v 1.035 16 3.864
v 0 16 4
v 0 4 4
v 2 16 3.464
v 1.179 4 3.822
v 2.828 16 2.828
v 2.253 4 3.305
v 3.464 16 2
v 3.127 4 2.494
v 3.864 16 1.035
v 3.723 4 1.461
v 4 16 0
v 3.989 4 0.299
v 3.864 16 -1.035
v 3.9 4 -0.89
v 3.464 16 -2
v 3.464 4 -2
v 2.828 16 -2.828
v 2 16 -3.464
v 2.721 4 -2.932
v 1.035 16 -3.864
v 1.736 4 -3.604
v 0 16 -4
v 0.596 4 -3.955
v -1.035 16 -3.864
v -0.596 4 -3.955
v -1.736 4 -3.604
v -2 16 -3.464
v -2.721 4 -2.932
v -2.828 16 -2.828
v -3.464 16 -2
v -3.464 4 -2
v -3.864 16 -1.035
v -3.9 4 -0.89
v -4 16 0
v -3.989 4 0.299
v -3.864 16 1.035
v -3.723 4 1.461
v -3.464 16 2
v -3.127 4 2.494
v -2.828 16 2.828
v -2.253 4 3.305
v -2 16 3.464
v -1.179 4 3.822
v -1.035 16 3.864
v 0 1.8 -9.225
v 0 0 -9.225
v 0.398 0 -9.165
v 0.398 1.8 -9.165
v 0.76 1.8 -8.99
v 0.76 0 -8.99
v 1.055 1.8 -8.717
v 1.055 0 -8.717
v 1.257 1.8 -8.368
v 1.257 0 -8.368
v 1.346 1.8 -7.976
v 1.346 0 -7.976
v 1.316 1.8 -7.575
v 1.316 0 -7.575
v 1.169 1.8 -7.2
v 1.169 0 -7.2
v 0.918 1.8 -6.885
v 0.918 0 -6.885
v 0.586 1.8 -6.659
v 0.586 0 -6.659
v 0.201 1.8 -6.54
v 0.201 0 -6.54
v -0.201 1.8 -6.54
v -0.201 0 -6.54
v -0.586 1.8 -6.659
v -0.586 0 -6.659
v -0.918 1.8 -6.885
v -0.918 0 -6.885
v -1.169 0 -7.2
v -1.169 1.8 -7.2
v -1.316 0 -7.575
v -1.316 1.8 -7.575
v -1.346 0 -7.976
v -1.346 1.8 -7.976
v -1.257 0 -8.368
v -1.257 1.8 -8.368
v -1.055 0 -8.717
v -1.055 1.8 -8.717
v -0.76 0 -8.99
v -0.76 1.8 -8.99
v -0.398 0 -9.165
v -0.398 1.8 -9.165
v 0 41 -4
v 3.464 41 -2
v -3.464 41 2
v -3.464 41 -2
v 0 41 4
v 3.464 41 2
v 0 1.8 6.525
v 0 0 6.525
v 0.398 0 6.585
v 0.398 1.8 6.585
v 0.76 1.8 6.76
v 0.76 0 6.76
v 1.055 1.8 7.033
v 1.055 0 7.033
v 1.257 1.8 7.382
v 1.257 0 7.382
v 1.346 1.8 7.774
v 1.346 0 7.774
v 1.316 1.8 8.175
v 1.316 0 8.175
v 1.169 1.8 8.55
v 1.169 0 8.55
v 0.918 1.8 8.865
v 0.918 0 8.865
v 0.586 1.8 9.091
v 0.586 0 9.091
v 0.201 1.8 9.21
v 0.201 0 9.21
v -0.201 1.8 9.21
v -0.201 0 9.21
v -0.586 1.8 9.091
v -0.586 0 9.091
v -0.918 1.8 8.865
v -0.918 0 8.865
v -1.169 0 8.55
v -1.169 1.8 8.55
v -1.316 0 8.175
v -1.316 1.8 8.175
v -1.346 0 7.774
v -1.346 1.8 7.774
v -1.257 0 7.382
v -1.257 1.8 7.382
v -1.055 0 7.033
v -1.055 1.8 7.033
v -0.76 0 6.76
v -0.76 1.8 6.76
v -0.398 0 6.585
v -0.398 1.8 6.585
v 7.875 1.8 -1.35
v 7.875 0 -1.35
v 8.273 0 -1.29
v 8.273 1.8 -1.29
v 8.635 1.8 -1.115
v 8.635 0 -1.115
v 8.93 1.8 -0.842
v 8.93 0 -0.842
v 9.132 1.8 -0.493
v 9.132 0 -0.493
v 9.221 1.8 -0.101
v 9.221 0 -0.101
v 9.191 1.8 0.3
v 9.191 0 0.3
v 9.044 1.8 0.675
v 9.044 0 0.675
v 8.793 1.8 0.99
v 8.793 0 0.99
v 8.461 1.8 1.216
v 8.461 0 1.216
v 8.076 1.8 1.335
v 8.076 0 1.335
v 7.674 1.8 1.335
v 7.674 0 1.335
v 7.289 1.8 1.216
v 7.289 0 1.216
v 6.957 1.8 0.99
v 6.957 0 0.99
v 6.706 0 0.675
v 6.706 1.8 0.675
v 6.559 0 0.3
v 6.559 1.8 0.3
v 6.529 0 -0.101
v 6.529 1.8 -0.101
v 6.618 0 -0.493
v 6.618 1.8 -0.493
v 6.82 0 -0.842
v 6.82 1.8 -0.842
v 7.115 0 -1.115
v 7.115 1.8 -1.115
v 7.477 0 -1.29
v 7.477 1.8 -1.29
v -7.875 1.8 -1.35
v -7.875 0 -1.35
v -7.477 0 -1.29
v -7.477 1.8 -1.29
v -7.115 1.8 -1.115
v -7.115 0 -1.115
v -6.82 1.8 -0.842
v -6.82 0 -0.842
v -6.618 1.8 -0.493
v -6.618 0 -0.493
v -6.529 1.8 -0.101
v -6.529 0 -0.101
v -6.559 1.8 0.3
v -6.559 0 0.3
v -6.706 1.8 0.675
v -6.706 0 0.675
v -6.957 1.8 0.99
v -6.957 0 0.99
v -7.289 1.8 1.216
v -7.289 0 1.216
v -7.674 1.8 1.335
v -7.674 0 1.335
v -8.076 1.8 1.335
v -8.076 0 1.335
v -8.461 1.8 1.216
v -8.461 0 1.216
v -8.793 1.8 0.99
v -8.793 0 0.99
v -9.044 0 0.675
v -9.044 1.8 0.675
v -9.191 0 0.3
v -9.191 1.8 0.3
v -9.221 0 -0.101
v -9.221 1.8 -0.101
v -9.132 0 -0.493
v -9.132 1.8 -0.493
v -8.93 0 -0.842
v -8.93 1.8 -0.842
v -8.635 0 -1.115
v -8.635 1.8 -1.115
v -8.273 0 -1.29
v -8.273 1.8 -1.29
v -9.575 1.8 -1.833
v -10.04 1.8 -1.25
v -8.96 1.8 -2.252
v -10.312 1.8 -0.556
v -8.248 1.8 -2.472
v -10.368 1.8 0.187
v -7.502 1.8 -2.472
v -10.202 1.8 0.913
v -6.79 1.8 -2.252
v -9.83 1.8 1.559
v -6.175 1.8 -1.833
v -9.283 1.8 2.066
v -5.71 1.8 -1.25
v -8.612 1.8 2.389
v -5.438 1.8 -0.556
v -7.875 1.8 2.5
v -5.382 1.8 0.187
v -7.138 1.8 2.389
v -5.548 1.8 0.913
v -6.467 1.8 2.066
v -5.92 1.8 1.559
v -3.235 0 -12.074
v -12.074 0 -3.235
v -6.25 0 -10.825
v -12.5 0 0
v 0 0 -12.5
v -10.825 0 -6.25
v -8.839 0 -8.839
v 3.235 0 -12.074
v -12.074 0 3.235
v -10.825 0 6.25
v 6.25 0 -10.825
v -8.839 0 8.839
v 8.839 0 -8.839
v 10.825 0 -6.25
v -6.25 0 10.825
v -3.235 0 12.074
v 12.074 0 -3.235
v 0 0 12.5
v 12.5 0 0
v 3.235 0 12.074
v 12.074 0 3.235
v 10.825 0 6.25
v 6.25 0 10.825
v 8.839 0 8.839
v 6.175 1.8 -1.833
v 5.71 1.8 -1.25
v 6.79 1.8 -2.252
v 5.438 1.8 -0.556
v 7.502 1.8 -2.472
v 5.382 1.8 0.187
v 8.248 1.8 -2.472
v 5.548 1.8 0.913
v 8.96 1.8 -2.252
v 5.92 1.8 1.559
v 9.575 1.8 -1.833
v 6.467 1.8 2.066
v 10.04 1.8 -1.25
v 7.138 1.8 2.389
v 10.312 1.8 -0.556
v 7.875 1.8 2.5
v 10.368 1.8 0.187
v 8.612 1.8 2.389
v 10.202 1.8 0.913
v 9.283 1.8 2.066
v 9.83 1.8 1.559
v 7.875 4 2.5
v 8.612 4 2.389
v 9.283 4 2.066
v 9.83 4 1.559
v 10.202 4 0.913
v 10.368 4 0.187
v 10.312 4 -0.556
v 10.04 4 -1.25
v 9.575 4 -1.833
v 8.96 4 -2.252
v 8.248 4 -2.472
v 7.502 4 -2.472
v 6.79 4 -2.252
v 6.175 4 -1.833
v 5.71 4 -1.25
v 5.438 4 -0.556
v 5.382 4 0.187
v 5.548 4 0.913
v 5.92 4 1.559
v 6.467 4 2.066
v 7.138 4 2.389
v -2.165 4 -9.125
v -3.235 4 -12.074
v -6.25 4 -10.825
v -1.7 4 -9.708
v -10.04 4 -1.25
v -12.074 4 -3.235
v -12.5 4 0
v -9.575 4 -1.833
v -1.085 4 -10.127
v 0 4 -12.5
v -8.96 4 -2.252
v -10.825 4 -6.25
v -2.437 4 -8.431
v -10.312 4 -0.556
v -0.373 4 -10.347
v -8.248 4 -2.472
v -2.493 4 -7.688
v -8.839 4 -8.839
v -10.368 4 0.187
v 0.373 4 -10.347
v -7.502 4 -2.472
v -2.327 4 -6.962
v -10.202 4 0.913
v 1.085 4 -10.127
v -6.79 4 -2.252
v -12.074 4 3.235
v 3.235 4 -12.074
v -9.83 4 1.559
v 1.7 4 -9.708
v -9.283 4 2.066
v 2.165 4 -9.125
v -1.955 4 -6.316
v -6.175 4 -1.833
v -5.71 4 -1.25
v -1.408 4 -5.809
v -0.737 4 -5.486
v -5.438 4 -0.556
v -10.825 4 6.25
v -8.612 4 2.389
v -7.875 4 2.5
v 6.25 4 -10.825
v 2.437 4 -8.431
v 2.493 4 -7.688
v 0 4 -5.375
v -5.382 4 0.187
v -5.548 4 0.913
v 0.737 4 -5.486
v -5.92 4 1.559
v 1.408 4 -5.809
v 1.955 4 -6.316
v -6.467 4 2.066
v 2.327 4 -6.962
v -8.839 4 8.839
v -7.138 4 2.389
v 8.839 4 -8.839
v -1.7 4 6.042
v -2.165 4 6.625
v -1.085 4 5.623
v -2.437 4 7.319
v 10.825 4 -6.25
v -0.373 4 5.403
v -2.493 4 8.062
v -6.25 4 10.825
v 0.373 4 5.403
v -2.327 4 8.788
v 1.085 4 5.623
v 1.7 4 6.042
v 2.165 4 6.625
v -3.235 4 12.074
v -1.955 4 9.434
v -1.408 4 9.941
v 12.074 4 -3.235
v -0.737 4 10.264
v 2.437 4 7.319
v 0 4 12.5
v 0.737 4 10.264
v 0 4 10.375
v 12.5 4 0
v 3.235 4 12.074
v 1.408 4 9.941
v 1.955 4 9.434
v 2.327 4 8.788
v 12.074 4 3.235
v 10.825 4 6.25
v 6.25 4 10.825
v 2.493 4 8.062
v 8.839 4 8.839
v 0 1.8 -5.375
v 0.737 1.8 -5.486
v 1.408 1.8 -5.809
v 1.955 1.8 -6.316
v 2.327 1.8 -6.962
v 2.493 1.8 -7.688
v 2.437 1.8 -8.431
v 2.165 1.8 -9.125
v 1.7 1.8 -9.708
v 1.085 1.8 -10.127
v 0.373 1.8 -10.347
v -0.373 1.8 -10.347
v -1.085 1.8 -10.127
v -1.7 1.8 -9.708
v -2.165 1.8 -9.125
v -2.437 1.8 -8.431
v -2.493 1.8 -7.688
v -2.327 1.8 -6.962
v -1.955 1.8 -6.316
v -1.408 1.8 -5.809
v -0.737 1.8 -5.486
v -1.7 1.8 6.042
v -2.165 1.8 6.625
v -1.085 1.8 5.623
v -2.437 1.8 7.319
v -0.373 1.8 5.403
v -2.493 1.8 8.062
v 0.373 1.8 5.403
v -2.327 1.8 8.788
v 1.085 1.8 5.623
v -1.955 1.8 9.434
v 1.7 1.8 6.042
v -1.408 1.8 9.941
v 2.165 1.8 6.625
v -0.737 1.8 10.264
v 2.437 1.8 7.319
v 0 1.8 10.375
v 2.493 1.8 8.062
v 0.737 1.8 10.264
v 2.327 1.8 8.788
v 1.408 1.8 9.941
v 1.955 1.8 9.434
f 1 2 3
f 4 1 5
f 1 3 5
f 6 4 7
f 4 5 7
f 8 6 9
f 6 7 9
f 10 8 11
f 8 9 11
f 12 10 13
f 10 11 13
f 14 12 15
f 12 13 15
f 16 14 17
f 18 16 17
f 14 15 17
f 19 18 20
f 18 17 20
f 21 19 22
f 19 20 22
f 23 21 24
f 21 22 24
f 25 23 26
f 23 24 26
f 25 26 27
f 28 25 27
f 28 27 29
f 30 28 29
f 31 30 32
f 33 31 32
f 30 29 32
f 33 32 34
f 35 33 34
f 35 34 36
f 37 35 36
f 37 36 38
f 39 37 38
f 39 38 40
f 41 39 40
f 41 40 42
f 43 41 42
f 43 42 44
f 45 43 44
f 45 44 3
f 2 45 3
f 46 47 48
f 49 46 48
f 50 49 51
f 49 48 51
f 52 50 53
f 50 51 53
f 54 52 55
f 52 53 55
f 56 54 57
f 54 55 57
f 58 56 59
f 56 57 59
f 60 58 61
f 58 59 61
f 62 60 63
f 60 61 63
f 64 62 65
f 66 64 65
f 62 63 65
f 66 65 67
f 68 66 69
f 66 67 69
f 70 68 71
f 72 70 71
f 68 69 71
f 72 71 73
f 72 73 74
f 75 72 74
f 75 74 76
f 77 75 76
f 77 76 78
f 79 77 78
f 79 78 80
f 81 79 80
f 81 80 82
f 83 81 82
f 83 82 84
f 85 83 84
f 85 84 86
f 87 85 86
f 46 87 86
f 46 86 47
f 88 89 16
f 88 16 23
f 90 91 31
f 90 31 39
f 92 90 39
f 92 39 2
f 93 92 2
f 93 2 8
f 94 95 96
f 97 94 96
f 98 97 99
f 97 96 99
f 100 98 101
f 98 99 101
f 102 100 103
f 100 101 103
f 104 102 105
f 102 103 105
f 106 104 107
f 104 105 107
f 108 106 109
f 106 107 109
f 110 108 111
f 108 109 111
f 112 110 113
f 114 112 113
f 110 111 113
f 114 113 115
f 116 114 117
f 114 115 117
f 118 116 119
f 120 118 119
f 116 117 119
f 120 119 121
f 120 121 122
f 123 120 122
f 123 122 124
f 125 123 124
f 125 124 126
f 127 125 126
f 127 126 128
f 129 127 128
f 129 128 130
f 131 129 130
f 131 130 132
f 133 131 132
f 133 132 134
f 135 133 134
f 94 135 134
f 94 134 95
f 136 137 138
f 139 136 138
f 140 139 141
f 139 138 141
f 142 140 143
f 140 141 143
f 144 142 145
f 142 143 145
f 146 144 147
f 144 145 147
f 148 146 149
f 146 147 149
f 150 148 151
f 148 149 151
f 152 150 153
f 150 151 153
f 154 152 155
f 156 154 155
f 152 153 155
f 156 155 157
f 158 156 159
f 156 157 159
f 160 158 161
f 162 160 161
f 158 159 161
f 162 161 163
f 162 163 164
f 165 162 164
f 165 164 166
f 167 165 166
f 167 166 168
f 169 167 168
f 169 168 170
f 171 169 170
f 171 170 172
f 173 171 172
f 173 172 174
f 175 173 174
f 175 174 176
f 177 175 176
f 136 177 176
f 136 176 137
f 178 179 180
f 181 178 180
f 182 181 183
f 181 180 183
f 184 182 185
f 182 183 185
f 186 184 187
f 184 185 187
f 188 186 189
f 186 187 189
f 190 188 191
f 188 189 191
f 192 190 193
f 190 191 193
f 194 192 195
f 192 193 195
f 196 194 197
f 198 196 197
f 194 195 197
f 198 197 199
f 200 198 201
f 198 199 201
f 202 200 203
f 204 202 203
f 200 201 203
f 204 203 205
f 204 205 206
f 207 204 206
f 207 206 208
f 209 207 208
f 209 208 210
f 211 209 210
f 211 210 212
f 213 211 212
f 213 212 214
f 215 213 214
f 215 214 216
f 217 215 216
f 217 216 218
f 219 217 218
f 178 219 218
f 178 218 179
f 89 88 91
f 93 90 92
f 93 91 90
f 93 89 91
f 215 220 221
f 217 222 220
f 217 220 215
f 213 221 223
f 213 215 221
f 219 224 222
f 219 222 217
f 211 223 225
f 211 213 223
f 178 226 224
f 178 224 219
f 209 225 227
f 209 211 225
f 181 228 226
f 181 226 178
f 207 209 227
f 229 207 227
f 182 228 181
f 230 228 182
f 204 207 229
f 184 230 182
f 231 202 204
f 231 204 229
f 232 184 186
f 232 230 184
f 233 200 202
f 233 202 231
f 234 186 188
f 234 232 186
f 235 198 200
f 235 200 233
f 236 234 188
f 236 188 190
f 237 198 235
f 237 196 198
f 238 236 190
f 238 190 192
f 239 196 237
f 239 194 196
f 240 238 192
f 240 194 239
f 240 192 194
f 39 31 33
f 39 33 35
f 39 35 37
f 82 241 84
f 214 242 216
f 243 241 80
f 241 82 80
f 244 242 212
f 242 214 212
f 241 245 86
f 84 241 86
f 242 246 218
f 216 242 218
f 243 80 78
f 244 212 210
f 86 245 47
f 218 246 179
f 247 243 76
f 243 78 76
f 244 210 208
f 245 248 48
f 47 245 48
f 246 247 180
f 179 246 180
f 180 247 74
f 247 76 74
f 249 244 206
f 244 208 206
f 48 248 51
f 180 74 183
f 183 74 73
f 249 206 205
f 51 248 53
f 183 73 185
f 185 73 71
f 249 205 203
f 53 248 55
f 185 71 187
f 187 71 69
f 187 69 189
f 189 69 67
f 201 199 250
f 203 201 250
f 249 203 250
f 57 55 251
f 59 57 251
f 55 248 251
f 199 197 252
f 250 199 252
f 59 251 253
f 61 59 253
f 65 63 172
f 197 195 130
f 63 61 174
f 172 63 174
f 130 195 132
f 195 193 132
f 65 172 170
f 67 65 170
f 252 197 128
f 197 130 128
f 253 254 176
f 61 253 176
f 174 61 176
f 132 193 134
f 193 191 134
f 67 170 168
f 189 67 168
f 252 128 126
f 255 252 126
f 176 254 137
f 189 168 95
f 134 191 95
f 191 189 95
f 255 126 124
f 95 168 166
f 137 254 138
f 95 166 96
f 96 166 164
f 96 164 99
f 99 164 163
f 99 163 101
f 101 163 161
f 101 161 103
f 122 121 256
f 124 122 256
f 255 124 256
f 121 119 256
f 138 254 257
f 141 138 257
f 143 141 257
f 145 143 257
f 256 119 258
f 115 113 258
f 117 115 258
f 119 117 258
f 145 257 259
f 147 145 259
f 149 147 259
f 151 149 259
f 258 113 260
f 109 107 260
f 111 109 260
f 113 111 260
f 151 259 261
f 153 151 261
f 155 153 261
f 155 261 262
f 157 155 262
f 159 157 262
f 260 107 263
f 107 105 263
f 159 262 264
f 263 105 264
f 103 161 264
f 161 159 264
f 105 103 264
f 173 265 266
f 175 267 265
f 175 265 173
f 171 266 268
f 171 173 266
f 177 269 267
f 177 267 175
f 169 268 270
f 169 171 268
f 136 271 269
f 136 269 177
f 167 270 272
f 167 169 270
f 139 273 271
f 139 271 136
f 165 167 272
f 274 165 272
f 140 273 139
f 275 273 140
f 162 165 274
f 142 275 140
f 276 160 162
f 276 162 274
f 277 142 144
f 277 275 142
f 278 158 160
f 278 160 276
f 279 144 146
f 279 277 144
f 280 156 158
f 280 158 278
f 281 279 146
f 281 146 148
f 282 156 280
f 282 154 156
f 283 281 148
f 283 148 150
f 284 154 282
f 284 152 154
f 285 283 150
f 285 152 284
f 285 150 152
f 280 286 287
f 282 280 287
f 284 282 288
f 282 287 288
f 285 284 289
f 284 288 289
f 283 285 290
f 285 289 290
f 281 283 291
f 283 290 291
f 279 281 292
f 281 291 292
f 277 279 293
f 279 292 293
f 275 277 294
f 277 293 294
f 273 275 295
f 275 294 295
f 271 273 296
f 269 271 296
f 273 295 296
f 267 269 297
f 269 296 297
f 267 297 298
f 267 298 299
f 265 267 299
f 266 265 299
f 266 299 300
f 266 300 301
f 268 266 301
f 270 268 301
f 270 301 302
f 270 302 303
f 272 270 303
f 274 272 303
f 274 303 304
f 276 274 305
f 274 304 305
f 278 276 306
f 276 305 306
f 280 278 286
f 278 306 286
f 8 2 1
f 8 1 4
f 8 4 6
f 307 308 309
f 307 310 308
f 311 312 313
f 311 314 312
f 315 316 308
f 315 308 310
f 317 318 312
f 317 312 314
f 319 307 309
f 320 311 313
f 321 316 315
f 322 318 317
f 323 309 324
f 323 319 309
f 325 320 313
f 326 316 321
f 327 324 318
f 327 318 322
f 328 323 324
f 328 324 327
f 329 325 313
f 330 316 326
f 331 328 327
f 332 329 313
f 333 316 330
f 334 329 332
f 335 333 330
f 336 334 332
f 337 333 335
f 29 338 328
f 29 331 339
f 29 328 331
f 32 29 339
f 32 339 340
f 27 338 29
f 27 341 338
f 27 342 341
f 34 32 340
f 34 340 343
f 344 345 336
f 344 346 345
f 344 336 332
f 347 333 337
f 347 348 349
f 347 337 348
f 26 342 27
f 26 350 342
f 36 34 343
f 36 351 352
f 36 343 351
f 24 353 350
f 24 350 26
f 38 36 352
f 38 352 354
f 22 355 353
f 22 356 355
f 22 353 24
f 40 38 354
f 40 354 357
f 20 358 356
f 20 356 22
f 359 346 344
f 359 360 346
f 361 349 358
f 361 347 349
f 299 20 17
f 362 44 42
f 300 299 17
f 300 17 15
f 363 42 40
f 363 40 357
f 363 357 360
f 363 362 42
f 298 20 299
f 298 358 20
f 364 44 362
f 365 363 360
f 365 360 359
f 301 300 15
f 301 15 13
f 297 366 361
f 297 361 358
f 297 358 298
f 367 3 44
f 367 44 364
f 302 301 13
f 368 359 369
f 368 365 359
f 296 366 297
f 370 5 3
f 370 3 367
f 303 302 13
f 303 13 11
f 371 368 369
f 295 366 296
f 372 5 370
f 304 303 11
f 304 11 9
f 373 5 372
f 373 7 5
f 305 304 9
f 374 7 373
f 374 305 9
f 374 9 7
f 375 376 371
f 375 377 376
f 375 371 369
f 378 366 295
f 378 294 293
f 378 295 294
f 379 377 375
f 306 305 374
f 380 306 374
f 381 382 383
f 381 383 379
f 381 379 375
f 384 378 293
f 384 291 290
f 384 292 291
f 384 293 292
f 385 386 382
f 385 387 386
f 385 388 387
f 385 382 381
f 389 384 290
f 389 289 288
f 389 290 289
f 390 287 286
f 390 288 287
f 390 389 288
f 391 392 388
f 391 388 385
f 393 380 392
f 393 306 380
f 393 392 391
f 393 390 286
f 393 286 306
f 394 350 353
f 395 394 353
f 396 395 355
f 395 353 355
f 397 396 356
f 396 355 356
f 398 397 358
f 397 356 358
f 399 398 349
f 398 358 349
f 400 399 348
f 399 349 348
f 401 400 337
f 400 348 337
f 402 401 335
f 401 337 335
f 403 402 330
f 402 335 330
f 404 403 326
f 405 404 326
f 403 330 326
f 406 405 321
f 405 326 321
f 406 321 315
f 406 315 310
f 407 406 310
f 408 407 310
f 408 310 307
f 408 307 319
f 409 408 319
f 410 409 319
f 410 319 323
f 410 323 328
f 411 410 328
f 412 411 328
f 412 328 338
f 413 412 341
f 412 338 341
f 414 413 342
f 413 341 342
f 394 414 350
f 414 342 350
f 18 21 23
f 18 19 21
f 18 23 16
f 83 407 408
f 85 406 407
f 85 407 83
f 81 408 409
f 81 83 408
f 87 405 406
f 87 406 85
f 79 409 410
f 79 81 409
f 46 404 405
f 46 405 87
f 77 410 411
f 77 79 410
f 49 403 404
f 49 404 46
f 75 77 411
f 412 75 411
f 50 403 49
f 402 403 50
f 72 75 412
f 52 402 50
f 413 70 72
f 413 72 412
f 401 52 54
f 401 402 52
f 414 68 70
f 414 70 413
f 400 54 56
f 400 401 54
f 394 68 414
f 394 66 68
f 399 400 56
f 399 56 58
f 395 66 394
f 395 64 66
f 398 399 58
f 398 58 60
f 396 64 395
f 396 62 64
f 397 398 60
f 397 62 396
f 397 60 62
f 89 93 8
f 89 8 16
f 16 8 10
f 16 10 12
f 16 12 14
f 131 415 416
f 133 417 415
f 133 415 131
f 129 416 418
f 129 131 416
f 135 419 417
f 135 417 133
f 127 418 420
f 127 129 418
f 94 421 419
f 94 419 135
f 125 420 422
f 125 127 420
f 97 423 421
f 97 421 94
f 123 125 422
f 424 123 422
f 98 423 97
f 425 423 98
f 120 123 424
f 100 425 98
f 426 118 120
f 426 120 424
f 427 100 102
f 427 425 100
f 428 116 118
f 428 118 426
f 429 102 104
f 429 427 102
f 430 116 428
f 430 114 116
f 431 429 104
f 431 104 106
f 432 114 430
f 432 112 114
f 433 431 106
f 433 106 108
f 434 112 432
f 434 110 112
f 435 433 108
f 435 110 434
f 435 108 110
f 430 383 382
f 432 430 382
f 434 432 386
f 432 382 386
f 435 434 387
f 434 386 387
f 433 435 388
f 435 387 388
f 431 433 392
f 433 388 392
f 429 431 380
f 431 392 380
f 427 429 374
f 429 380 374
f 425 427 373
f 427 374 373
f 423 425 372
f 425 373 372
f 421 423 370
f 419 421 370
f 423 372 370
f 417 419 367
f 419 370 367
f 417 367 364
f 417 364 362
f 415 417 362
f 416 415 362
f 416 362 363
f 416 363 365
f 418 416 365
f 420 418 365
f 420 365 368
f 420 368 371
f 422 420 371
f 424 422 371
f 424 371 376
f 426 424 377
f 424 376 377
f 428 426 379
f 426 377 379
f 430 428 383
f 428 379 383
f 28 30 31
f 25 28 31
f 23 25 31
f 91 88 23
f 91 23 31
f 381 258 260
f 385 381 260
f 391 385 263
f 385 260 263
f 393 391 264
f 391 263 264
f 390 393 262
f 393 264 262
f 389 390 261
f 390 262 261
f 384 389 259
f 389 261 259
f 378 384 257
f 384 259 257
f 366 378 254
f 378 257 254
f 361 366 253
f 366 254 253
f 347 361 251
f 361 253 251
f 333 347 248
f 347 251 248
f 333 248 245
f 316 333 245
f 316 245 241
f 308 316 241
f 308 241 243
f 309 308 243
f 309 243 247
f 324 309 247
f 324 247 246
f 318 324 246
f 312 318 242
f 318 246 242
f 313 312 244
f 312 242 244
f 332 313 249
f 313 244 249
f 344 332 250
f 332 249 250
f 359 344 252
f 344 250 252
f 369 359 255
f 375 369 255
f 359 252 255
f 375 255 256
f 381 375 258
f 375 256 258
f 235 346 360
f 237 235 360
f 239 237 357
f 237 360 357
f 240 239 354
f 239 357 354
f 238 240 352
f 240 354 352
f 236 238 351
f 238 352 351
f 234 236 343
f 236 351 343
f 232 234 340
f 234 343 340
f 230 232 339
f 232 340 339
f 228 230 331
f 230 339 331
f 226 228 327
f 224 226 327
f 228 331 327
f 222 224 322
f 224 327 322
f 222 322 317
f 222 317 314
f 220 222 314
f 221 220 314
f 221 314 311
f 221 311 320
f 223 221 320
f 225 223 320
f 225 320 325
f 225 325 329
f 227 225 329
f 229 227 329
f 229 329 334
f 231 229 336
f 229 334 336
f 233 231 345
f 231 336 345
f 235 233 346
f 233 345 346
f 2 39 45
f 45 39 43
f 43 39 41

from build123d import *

# Parameters (mm, degrees)
CROQUIS3_R              = 12.5
SALIENTE_EXTRUIR1_DEPTH = 4
CROQUIS4_R              = 4
SALIENTE_EXTRUIR2_DEPTH = 37
CROQUIS12_OUTSIDE_W     = 37.828
CROQUIS12_OUTSIDE_H     = 37.828
CORTAR_EXTRUIR7_DEPTH   = 25
CROQUIS13_R             = 1.35
CORTAR_EXTRUIR8_DEPTH   = 10
CROQUIS14_R             = 2.5
CORTAR_EXTRUIR9_DEPTH   = 2.2


with BuildPart() as part:
    # Croquis3 → Saliente-Extruir1 (new body)
    with BuildSketch(Plane(origin=(0, 0, 0), x_dir=(1, 0, 0), z_dir=(0, 1, 0))):
        with Locations(Location((0, 0, 0), (0, 0, 270))):
            Circle(CROQUIS3_R)
    extrude(amount=SALIENTE_EXTRUIR1_DEPTH)

    # Croquis4 → Saliente-Extruir2 (add)
    with BuildSketch(Plane(origin=(0, 4, 0), x_dir=(1, 0, 0), z_dir=(0, 1, 0))):
        with Locations(Location((0, 0, 0), (0, 0, 270))):
            Circle(CROQUIS4_R)
    extrude(amount=SALIENTE_EXTRUIR2_DEPTH)

    # Croquis12 outside → Cortar-Extruir7 (cut)
    with BuildSketch(Plane(origin=(0, 41, 0), x_dir=(1, 0, 0), z_dir=(0, 1, 0))):
        Rectangle(CROQUIS12_OUTSIDE_W, CROQUIS12_OUTSIDE_H)
        Polygon((0, 4), (-3.464101615, 2), (-3.464101615, -2), (0, -4), (3.464101615, -2), (3.464101615, 2), align=None, mode=Mode.SUBTRACT)
    extrude(amount=-CORTAR_EXTRUIR7_DEPTH, mode=Mode.SUBTRACT)

    # Croquis13 → Cortar-Extruir8 (cut)
    with BuildSketch(Plane.XZ):
        with Locations(Location((0, 7.875, 0), (0, 0, 270))):
            Circle(CROQUIS13_R)
        with Locations(Location((7.875, 0, 0), (0, 0, 270))):
            Circle(CROQUIS13_R)
        with Locations(Location((0, -7.875, 0), (0, 0, 270))):
            Circle(CROQUIS13_R)
        with Locations(Location((-7.875, 0, 0), (0, 0, 270))):
            Circle(CROQUIS13_R)
    extrude(amount=-CORTAR_EXTRUIR8_DEPTH, mode=Mode.SUBTRACT)

    # Croquis14 → Cortar-Extruir9 (cut)
    with BuildSketch(Plane(origin=(0, 4, 0), x_dir=(1, 0, 0), z_dir=(0, 1, 0))):
        with Locations(Location((0, 7.875, 0), (0, 0, 270))):
            Circle(CROQUIS14_R)
        with Locations(Location((7.875, 0, 0), (0, 0, 270))):
            Circle(CROQUIS14_R)
        with Locations(Location((0, -7.875, 0), (0, 0, 270))):
            Circle(CROQUIS14_R)
        with Locations(Location((-7.875, 0, 0), (0, 0, 270))):
            Circle(CROQUIS14_R)
    extrude(amount=-CORTAR_EXTRUIR9_DEPTH, mode=Mode.SUBTRACT)


solid = part.part
